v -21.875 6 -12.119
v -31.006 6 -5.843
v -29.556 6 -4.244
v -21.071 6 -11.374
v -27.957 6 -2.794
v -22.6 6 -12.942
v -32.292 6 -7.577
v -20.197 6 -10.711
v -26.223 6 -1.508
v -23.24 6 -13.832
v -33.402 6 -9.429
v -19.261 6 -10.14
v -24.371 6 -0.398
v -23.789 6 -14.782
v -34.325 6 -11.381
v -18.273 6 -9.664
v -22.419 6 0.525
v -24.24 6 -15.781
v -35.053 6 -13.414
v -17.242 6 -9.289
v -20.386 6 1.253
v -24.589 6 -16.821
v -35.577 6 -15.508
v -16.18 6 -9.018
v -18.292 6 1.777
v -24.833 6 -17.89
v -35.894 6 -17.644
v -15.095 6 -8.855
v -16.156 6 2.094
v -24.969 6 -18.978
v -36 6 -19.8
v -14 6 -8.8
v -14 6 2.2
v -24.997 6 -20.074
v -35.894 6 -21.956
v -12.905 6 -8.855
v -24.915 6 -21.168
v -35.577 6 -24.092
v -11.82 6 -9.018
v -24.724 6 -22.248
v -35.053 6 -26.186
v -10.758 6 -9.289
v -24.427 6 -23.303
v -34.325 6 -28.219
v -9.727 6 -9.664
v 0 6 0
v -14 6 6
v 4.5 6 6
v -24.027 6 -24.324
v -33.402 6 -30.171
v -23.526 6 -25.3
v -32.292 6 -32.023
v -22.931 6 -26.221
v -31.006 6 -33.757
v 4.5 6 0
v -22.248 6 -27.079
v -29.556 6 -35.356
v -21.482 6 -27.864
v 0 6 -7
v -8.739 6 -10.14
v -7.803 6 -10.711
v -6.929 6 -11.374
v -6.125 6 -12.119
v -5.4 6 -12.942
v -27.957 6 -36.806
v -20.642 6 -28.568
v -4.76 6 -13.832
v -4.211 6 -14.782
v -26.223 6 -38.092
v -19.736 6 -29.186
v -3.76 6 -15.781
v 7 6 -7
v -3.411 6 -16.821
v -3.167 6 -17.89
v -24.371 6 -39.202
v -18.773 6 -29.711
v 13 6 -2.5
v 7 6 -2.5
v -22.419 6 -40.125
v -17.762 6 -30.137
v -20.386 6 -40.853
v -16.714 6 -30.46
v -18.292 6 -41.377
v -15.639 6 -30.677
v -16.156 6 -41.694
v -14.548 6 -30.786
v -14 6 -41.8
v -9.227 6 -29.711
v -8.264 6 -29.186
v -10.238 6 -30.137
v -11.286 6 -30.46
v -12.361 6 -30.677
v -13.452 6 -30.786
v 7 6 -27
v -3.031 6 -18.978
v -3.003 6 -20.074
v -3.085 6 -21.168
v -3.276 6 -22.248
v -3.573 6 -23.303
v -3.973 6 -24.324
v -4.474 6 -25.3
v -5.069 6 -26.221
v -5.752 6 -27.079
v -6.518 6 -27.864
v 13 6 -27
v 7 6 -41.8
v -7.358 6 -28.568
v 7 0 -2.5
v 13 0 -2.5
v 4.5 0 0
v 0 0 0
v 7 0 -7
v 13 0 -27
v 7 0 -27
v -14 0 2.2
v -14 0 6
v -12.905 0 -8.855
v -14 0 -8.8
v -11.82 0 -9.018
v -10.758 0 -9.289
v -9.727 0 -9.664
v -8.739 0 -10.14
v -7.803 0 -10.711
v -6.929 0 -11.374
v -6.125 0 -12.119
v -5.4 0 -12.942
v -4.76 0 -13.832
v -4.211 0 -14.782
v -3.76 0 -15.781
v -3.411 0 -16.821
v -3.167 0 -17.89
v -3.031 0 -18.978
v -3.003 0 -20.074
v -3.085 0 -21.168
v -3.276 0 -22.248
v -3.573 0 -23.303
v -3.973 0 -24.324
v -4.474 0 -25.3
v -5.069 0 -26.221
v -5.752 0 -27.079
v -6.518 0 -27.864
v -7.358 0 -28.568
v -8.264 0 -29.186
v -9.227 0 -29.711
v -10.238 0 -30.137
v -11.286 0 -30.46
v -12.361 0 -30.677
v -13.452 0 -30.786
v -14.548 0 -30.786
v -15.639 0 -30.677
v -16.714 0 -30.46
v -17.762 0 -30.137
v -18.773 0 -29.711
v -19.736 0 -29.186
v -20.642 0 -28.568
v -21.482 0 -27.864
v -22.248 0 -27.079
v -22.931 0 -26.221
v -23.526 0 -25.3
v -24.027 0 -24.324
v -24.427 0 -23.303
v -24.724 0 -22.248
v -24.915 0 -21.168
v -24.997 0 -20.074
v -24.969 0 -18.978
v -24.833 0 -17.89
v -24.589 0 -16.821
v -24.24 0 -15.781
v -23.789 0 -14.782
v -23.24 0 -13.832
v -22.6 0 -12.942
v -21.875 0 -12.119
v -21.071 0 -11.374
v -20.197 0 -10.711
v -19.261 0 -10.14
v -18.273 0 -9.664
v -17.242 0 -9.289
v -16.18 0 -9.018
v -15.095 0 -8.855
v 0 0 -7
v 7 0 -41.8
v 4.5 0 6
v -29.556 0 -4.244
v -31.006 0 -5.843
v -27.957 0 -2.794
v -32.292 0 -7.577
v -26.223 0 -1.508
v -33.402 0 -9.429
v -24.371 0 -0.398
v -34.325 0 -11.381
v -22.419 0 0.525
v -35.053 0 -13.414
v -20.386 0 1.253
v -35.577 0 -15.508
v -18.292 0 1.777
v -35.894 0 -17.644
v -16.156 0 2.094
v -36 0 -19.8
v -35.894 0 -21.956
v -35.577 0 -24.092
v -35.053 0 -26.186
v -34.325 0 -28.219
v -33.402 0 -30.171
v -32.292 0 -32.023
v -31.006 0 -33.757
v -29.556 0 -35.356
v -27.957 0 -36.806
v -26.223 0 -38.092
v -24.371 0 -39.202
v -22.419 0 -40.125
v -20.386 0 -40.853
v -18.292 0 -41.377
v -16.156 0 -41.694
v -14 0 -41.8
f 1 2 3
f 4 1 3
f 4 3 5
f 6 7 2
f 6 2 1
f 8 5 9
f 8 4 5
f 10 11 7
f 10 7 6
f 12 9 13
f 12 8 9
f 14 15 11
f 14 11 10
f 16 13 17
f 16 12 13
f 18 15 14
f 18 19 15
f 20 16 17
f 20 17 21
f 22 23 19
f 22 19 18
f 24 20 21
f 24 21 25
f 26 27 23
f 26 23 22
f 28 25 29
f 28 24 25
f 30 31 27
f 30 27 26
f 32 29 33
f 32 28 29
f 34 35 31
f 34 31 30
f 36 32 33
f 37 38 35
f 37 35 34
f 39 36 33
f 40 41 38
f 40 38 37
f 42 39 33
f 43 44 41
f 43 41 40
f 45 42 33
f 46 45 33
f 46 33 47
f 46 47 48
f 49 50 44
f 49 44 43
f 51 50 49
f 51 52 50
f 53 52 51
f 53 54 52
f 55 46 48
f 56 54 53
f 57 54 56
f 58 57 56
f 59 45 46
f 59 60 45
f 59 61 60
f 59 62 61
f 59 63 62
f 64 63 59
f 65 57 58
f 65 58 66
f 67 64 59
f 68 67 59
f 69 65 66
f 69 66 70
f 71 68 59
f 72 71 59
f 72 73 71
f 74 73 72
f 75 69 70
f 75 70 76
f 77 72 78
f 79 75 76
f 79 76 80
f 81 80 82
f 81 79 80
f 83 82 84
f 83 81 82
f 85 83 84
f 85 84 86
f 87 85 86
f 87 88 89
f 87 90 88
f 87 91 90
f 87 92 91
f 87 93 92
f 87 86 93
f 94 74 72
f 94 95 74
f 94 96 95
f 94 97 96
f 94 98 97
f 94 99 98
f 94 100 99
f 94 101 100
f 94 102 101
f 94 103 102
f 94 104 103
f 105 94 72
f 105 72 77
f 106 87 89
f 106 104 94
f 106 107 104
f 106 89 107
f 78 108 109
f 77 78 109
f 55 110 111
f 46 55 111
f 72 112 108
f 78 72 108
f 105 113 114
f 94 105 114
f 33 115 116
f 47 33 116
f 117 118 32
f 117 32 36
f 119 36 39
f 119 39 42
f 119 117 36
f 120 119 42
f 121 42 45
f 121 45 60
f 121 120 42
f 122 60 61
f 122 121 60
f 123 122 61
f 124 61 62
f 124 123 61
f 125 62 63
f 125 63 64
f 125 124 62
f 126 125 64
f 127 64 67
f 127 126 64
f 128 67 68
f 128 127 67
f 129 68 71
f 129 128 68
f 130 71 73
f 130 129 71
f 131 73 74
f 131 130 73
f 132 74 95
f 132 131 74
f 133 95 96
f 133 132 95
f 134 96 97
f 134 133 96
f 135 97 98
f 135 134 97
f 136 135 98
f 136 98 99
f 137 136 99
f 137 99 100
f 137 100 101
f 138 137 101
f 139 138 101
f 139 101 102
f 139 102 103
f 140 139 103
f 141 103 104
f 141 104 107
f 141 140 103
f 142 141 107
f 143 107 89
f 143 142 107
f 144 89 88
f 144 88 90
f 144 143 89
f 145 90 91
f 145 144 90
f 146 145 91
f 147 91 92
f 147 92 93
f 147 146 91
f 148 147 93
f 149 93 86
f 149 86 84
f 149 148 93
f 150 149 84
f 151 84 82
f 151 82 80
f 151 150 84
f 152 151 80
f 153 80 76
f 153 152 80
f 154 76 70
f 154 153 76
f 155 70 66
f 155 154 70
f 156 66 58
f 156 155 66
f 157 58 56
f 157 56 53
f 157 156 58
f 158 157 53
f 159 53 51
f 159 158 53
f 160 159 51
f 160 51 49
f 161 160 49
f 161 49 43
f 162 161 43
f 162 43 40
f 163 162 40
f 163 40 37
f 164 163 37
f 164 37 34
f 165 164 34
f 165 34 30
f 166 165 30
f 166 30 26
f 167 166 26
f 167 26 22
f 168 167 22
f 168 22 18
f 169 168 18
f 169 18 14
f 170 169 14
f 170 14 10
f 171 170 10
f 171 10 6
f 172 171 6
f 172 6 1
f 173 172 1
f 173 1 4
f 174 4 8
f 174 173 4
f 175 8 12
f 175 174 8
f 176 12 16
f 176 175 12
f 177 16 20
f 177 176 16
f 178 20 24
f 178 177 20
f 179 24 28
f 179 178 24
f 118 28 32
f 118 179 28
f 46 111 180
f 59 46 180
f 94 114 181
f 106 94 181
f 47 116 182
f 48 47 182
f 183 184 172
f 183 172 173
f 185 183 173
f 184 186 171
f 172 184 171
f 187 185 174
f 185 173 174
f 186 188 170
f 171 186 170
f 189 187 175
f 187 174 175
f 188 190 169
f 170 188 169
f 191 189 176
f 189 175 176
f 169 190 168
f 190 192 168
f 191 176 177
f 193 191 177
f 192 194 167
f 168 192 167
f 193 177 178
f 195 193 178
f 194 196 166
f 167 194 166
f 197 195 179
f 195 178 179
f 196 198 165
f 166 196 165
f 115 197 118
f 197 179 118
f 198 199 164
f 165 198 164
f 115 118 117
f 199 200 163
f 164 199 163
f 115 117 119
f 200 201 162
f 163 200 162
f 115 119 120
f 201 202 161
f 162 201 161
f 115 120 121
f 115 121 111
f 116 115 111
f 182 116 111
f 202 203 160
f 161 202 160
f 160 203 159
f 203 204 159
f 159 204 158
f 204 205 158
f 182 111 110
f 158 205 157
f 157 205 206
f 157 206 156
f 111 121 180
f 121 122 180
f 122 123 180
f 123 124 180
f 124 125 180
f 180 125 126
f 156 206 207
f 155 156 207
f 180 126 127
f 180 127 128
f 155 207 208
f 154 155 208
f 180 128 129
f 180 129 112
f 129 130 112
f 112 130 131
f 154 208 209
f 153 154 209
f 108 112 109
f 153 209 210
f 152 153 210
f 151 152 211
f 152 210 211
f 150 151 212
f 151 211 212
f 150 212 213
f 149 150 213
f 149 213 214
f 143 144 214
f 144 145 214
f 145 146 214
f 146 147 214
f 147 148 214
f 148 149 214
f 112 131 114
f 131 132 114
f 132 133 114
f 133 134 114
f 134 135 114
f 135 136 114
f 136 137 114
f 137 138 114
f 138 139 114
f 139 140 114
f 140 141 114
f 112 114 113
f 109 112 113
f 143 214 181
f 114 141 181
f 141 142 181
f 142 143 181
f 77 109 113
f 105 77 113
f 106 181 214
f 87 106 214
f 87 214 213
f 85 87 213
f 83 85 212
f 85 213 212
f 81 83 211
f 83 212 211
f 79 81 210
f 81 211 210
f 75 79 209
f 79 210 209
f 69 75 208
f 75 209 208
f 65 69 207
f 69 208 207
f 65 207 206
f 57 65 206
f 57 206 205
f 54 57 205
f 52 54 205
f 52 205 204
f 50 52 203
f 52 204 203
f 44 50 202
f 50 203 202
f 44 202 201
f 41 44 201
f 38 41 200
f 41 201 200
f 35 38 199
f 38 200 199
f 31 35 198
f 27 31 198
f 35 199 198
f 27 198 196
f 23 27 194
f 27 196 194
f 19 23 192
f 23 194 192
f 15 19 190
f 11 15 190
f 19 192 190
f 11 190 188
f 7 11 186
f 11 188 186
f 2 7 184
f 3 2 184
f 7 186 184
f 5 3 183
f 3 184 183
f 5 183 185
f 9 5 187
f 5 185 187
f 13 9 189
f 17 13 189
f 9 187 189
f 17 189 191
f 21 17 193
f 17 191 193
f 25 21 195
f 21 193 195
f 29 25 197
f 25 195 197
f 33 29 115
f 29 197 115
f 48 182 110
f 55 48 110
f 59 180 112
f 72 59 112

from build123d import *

# Parameters (mm, degrees)
SKETCH1_R           = 11
BOSS_EXTRUDE1_DEPTH = 6


with BuildPart() as part:
    # Sketch1 → Boss-Extrude1 (new body)
    with BuildSketch(Plane(origin=(0, 0, 0), x_dir=(1, 0, 0), z_dir=(0, 1, 0))):
        with BuildLine():
            Line((0, 0), (0, 7))
            Line((0, 7), (7, 7))
            Line((7, 7), (7, 2.5))
            Line((7, 2.5), (13, 2.5))
            Line((13, 2.5), (13, 27))
            Line((13, 27), (7, 27))
            Line((7, 27), (7, 41.8))
            Line((7, 41.8), (-14, 41.8))
            ThreePointArc((-14, 41.8), (-36, 19.8), (-14, -2.2))
            Line((-14, -2.2), (-14, -6))
            Line((-14, -6), (4.5, -6))
            Line((4.5, -6), (4.5, 0))
            Line((4.5, 0), (0, 0))
        make_face()
        with Locations(Location((-14, 19.8, 0), (0, 0, 270))):
            Circle(SKETCH1_R, mode=Mode.SUBTRACT)
    extrude(amount=BOSS_EXTRUDE1_DEPTH)


solid = part.part
